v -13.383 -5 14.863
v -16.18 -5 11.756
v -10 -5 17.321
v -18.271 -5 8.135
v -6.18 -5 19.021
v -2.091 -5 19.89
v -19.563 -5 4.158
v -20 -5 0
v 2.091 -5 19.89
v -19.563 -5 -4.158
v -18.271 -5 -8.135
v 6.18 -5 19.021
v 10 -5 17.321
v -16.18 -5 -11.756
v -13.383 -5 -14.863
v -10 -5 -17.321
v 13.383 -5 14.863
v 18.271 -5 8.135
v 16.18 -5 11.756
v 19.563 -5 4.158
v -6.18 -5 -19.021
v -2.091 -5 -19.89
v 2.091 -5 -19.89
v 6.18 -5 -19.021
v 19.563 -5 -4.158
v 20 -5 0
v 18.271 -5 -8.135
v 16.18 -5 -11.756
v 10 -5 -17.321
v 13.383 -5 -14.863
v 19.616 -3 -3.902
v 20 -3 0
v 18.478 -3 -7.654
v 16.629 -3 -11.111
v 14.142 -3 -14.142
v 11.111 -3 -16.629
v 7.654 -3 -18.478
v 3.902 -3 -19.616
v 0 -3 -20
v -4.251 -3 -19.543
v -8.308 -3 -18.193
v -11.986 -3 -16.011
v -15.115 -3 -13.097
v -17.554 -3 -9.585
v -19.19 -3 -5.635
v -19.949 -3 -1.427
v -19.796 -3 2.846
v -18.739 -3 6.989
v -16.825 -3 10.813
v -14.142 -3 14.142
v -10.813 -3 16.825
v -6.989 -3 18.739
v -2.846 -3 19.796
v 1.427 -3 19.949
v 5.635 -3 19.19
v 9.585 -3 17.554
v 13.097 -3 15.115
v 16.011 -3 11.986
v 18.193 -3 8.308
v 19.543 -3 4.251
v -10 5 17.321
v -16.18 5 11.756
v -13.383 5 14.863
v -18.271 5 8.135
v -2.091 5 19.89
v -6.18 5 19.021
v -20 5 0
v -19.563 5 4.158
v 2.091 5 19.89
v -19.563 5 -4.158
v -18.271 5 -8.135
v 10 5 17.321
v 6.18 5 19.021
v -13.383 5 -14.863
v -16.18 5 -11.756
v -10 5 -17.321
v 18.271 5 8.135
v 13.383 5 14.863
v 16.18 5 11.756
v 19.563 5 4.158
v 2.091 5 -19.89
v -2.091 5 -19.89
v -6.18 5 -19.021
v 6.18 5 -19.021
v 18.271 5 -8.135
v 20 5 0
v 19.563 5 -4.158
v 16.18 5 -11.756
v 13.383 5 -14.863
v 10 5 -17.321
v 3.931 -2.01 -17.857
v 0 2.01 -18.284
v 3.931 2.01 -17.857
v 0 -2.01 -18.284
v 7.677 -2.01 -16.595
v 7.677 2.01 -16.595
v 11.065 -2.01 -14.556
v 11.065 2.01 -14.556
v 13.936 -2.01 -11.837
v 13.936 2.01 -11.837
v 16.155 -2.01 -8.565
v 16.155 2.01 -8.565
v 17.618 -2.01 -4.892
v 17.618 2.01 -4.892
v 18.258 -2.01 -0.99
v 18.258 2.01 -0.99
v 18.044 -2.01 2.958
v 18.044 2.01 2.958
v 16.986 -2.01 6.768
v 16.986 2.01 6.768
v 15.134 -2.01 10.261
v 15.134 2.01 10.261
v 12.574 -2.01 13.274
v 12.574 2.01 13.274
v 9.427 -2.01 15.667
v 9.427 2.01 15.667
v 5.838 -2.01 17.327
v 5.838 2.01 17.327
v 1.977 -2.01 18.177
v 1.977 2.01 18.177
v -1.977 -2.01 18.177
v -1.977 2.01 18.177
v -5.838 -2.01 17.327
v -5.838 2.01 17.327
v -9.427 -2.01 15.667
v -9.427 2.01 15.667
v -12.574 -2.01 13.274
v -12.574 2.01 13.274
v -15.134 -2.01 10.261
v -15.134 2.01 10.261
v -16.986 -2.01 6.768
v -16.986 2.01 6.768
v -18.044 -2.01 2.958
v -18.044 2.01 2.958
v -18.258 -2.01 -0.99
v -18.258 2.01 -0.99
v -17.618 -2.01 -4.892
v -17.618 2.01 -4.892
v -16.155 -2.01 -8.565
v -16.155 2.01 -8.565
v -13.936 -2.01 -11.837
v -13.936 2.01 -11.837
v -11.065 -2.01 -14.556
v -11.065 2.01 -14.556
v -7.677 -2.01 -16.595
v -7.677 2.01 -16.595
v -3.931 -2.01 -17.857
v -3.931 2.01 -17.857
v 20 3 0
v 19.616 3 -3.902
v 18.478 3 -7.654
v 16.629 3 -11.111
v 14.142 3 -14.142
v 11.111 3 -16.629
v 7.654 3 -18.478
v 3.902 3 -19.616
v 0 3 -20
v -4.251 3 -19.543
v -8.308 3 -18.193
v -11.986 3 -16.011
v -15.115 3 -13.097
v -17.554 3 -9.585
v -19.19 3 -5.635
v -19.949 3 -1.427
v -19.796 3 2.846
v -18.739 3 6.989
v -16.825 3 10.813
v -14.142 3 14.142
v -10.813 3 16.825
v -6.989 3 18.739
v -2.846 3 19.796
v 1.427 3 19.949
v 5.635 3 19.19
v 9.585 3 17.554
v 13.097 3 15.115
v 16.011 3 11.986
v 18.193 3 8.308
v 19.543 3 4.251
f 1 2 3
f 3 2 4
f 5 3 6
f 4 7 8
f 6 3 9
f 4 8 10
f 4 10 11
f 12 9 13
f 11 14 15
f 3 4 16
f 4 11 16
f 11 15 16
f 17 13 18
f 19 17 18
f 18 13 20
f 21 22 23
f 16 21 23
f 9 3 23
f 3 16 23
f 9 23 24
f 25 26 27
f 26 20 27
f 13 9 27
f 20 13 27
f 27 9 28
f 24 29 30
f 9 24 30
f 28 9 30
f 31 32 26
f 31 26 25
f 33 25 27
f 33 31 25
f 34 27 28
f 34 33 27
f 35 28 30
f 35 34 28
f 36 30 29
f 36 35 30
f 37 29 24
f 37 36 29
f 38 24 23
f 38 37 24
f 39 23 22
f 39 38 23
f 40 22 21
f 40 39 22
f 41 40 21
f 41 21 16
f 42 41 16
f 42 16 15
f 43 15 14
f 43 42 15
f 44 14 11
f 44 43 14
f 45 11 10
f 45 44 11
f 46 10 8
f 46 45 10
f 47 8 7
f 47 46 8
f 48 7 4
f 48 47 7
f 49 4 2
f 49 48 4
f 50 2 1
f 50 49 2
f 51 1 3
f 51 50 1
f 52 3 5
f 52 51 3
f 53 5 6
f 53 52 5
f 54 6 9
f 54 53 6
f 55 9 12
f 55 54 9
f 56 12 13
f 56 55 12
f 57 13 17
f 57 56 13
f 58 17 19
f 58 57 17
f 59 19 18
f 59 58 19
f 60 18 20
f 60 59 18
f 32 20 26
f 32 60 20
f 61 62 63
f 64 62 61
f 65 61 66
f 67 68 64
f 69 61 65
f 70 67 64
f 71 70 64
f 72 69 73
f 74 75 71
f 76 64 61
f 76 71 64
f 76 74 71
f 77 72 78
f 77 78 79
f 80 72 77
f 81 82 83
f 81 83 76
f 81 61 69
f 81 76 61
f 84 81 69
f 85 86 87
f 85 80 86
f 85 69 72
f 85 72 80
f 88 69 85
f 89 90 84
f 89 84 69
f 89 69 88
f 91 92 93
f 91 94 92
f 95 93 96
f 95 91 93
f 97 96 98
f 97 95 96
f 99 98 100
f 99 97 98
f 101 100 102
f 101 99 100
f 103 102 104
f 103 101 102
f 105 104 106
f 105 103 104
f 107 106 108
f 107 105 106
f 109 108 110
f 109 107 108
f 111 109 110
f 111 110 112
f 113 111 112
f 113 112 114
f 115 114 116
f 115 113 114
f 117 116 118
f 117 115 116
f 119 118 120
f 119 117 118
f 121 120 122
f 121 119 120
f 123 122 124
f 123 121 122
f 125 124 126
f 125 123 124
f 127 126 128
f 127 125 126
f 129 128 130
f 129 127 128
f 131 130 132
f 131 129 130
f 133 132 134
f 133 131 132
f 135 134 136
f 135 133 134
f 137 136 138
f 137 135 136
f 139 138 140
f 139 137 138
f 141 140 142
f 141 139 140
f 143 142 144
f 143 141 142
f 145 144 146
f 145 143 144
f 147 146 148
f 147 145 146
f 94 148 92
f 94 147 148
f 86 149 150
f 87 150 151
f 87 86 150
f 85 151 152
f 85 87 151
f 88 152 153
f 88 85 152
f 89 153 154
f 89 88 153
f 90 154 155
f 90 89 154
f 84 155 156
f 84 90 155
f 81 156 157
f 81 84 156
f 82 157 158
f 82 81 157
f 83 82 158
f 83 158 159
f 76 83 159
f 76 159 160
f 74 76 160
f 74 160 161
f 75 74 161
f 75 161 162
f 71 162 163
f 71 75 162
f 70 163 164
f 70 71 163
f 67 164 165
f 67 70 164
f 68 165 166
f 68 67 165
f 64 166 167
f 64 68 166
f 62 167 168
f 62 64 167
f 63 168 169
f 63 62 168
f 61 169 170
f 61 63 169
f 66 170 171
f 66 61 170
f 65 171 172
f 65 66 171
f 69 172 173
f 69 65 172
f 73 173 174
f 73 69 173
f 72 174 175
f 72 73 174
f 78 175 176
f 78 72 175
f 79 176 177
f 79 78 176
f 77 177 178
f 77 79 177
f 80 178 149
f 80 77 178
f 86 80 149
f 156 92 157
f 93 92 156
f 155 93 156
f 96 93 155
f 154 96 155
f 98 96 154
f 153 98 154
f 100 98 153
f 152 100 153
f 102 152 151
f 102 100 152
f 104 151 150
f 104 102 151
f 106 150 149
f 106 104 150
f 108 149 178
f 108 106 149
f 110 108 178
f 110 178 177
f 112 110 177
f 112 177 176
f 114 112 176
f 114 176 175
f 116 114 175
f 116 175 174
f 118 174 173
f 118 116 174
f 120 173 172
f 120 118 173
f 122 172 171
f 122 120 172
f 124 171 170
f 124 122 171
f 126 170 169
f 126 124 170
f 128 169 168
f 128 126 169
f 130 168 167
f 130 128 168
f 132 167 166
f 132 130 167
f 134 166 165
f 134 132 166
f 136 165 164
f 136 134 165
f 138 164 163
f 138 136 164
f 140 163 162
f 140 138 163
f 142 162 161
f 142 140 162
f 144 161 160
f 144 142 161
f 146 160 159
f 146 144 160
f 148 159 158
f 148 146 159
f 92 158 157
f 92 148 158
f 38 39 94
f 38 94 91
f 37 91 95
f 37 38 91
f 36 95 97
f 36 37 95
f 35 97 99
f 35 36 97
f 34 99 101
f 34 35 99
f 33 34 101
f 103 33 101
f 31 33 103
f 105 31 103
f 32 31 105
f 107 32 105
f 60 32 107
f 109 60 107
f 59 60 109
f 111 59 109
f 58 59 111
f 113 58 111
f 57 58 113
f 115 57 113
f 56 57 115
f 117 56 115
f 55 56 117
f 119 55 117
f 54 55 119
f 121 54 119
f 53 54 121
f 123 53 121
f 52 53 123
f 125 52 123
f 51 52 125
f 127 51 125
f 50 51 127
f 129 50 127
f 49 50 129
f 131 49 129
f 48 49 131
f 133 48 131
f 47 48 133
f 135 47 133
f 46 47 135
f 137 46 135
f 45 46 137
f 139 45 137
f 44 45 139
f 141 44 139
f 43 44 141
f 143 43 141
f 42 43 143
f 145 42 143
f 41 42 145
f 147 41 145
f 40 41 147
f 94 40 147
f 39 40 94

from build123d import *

# Parameters (mm, degrees)
SKETCH2_R           = 20
BOSS_EXTRUDE1_DEPTH = 5


with BuildPart() as part:
    # Sketch2 → Boss-Extrude1 (new body, symmetric)
    with BuildSketch(Plane(origin=(0, 0, 0), x_dir=(1, 0, 0), z_dir=(0, 1, 0))):
        Circle(SKETCH2_R)
    extrude(amount=BOSS_EXTRUDE1_DEPTH, both=True)

    # Sketch3 → Cut-Revolve1 (revolve, cut)
    with BuildSketch(Plane(origin=(0, 0, 0), x_dir=(0, 0, -1), z_dir=(1, 0, 0))):
        Polygon((20, 3), (18.284475438, 2.009541432), (18.284475438, -2.009541432), (20, -3), align=None)
    revolve(axis=Axis((0, 7.747762259, 0), (0, -1, 0)), mode=Mode.SUBTRACT)


solid = part.part
